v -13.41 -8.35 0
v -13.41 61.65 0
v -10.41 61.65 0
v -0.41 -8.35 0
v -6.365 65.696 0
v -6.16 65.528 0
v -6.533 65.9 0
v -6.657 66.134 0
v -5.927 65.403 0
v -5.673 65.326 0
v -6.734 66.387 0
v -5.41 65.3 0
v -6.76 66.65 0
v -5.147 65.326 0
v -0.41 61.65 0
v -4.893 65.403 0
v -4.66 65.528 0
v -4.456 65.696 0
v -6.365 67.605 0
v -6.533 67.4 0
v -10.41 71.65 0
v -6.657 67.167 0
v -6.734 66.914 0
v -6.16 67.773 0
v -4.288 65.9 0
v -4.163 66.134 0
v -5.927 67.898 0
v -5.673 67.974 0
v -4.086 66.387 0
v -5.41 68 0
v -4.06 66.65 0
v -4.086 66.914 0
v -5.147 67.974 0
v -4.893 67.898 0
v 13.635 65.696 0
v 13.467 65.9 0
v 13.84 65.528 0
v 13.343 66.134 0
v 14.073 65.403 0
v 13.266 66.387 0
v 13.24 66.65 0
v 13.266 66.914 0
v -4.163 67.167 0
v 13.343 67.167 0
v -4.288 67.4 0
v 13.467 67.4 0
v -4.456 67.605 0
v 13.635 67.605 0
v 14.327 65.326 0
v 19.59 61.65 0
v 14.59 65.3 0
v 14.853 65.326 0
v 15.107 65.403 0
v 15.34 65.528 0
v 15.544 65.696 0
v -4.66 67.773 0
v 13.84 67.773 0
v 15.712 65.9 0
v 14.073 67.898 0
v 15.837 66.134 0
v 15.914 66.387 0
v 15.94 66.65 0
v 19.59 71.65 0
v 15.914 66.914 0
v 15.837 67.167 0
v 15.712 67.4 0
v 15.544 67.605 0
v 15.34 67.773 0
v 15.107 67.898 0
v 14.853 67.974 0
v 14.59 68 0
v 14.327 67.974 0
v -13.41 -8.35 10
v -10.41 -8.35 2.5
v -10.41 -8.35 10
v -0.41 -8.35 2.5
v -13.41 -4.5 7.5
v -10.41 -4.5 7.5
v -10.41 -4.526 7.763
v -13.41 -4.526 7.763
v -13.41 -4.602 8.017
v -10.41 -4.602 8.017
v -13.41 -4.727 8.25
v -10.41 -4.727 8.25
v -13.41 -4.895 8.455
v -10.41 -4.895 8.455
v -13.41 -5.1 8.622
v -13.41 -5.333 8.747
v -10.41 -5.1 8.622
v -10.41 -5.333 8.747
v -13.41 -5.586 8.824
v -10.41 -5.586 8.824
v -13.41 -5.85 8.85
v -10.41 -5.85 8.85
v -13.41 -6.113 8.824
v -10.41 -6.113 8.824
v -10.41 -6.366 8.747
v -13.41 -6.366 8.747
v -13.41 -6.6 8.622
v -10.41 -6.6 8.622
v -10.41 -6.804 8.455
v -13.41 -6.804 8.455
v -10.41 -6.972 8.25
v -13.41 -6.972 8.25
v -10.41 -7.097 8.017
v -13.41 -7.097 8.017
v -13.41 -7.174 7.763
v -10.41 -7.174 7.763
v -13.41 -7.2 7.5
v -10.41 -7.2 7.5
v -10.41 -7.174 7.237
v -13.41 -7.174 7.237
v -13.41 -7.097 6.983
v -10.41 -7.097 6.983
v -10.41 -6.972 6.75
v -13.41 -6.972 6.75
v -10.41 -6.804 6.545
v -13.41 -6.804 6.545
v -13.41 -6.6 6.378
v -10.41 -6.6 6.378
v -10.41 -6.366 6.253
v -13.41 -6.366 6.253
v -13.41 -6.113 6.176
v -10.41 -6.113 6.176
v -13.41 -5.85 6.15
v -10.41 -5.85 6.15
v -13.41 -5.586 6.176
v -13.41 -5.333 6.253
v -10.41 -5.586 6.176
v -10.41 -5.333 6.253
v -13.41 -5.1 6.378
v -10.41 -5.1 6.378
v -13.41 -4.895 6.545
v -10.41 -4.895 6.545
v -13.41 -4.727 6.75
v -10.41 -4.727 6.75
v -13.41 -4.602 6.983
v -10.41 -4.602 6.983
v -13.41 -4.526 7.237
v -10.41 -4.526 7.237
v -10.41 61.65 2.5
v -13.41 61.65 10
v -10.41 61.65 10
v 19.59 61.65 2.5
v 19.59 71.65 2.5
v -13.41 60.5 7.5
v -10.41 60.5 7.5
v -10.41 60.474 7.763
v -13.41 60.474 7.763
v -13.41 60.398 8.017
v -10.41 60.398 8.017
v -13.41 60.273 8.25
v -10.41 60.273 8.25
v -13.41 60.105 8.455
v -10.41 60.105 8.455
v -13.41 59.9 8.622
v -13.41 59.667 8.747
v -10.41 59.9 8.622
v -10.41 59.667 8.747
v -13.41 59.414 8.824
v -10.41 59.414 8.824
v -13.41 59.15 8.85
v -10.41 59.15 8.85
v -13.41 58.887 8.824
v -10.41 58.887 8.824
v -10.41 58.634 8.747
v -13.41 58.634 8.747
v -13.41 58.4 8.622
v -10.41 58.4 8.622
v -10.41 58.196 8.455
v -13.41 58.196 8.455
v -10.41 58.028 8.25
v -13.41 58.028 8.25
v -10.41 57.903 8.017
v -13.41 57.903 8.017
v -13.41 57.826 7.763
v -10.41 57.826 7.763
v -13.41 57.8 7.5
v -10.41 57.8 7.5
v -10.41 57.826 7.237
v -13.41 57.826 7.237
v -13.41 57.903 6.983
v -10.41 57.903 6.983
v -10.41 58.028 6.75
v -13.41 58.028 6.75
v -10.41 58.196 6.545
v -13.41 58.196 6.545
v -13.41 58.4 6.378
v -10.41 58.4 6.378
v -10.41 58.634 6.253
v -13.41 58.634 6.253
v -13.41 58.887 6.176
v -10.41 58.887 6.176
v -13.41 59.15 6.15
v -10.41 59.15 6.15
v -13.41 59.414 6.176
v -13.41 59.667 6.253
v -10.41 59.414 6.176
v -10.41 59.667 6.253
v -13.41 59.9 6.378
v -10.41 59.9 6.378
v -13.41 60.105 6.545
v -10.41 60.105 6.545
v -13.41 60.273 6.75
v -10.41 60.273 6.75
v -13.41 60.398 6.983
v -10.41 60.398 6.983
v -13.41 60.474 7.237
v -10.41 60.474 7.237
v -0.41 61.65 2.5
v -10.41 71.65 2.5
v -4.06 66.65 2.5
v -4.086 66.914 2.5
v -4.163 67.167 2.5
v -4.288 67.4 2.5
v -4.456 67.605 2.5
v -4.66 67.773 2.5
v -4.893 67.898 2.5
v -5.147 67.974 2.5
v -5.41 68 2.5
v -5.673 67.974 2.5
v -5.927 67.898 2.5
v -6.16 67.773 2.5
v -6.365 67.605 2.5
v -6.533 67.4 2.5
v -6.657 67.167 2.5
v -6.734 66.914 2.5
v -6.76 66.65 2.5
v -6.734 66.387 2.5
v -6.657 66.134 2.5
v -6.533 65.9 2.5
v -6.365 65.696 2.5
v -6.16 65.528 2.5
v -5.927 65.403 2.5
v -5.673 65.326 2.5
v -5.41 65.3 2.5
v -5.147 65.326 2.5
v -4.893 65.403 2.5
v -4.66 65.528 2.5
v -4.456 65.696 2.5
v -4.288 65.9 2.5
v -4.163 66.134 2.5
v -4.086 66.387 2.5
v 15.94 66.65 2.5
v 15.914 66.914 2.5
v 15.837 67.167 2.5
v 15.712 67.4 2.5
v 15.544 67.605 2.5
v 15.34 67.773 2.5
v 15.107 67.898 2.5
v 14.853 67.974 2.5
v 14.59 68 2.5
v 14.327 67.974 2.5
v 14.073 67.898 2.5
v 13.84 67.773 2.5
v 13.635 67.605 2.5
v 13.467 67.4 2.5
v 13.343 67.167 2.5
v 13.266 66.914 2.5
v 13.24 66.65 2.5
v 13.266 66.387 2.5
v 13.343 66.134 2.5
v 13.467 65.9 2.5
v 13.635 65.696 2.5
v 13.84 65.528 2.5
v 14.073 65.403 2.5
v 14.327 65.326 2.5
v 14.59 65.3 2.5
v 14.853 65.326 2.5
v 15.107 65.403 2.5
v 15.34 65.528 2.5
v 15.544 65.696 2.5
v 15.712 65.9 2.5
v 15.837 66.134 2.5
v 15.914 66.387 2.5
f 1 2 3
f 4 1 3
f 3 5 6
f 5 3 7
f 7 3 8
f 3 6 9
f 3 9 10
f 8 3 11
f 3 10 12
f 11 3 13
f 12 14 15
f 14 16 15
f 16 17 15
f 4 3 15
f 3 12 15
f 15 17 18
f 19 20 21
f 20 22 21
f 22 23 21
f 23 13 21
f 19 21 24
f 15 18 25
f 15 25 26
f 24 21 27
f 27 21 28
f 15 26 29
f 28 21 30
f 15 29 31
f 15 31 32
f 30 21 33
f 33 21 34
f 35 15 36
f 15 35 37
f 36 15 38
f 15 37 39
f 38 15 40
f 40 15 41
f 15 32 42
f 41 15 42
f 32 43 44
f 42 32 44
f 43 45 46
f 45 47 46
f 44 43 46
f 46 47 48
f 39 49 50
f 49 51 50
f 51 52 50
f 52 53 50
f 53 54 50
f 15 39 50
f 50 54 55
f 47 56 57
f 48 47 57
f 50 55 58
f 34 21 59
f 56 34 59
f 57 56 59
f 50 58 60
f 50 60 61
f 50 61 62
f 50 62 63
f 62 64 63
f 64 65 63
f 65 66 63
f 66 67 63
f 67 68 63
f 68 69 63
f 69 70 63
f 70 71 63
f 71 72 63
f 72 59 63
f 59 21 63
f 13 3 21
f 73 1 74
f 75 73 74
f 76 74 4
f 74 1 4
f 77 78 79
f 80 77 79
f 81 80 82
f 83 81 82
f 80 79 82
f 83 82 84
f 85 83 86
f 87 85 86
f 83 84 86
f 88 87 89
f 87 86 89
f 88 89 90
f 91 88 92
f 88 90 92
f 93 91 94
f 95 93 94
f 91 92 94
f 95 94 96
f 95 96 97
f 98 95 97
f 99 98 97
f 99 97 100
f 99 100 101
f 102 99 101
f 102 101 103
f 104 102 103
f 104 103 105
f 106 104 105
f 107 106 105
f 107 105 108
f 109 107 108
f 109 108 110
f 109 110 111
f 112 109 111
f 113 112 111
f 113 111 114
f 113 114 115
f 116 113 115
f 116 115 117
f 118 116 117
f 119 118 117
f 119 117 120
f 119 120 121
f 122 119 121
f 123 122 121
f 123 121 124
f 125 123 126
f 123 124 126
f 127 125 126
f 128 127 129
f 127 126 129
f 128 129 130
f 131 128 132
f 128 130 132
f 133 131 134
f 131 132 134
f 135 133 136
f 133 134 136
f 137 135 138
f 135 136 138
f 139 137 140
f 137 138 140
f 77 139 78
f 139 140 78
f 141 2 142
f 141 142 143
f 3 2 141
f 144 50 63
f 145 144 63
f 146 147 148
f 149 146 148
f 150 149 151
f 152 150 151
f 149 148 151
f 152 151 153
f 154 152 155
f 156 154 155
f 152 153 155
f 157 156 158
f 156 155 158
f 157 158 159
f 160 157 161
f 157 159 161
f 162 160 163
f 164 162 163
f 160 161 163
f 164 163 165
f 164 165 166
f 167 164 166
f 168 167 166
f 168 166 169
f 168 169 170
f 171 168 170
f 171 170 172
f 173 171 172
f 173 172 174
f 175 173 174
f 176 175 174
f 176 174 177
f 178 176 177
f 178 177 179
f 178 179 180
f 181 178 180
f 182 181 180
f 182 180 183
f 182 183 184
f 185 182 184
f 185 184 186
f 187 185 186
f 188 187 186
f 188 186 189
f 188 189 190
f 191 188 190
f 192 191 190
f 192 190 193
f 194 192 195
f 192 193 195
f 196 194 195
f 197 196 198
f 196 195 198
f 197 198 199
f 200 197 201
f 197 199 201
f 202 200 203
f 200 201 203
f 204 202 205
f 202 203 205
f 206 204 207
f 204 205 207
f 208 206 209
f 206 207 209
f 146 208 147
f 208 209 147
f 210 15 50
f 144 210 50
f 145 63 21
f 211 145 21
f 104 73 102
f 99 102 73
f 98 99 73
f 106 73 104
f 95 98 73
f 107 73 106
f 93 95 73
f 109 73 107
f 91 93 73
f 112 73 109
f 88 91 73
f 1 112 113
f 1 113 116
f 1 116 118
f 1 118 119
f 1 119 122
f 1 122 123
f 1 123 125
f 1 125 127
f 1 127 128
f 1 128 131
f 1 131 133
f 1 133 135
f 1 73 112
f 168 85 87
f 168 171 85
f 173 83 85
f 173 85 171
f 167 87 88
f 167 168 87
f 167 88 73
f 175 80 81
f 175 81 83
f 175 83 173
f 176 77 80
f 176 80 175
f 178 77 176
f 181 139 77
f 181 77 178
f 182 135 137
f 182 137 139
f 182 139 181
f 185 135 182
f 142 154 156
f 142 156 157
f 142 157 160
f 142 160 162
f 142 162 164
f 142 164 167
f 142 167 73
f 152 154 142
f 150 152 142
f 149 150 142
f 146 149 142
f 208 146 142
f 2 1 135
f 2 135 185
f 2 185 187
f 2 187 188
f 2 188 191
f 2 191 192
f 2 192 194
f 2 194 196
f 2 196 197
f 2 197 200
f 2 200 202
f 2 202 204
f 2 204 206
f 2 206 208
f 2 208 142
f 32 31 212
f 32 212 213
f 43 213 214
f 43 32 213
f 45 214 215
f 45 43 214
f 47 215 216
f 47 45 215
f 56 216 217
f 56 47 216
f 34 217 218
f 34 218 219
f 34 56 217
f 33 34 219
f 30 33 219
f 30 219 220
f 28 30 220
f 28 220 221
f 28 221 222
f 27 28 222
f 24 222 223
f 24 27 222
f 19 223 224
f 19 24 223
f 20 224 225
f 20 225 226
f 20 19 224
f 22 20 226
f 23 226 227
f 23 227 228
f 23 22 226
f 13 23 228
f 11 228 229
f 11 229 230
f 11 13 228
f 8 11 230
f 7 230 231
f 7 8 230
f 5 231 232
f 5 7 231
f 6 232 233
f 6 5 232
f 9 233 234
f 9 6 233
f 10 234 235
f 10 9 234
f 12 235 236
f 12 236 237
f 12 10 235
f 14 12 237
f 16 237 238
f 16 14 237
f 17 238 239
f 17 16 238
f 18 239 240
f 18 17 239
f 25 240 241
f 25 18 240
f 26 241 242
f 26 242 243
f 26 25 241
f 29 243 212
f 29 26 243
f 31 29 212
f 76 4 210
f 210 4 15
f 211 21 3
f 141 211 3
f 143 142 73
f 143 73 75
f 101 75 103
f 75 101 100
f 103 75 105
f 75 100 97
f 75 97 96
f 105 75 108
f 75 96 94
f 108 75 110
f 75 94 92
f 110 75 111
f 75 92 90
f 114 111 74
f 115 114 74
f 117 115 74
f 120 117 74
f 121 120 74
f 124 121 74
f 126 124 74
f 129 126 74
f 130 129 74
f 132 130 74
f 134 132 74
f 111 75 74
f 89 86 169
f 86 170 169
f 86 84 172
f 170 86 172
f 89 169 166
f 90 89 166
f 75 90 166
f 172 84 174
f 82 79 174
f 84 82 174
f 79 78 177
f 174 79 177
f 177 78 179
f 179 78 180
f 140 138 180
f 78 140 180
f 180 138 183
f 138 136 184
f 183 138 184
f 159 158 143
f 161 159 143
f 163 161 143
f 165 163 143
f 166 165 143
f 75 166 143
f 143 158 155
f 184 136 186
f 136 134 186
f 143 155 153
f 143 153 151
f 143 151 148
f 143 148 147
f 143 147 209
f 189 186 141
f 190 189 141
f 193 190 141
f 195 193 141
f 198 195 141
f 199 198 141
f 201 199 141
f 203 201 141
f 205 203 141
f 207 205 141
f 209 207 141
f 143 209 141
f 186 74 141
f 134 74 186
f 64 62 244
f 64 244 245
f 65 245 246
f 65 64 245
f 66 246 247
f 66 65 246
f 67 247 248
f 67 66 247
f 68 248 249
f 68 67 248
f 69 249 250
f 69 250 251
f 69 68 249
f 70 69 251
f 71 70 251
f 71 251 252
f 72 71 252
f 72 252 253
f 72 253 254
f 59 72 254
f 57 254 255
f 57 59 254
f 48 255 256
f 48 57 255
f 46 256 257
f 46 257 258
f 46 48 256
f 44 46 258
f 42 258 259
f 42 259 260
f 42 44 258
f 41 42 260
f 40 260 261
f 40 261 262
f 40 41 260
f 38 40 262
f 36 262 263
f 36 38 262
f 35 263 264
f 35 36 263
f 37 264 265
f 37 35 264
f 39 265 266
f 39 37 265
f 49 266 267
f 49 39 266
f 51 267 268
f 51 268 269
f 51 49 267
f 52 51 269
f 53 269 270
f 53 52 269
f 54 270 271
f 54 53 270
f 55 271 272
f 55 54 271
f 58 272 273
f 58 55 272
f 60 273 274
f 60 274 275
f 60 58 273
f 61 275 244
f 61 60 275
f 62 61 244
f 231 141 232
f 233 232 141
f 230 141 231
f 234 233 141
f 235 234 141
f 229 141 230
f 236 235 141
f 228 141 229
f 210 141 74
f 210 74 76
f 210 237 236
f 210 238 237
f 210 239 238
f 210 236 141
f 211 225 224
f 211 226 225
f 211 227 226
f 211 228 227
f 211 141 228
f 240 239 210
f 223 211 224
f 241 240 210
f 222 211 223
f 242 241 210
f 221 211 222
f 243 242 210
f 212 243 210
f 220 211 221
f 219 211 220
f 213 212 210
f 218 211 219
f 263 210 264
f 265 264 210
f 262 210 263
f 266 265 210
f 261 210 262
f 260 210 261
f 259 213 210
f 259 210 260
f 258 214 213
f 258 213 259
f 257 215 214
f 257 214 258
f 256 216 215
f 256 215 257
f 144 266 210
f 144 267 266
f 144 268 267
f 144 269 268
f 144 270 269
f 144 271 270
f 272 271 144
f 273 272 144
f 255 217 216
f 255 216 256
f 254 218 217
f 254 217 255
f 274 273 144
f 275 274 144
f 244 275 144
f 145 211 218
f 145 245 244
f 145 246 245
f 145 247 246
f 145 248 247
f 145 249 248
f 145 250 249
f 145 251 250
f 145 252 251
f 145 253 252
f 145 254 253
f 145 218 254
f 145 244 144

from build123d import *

# Parameters (mm, degrees)
F0_R     = 1.35
F1_DEPTH = 2.5
F0_W     = 3
F0_H     = 70
F2_DEPTH = 10
F3_R     = 1.35
F4_DEPTH = 3.001


with BuildPart() as f1:
    # F0 (on Top) → F1 (new body)
    with BuildSketch(Plane.XY):
        Polygon((19.589888, 61.650399), (19.589888, 71.650399), (-10.410112, 71.650399), (-10.410112, 61.650399), (-10.410112, -8.349601), (-0.410112, -8.349601), (-0.410112, 61.650399), align=None)
        with Locations((-5.410112, 66.650399)):
            Circle(F0_R, mode=Mode.SUBTRACT)
        with Locations((14.589888, 66.650399)):
            Circle(F0_R, mode=Mode.SUBTRACT)
    extrude(amount=F1_DEPTH)

    # F0 (on Top) → F2 (join)
    with BuildSketch(Plane.XY):
        with Locations((-11.910112, 26.650399)):
            Rectangle(F0_W, F0_H)
    extrude(amount=F2_DEPTH)

    # F3 (on face) → F4 (cut, through all)
    with BuildSketch(Plane.YZ.offset(-10.410112)):
        with Locations((-5.849601, 7.5)):
            Circle(F3_R)
        with Locations((59.150399, 7.5)):
            Circle(F3_R)
    extrude(amount=-F4_DEPTH, mode=Mode.SUBTRACT)


solid = f1.part
